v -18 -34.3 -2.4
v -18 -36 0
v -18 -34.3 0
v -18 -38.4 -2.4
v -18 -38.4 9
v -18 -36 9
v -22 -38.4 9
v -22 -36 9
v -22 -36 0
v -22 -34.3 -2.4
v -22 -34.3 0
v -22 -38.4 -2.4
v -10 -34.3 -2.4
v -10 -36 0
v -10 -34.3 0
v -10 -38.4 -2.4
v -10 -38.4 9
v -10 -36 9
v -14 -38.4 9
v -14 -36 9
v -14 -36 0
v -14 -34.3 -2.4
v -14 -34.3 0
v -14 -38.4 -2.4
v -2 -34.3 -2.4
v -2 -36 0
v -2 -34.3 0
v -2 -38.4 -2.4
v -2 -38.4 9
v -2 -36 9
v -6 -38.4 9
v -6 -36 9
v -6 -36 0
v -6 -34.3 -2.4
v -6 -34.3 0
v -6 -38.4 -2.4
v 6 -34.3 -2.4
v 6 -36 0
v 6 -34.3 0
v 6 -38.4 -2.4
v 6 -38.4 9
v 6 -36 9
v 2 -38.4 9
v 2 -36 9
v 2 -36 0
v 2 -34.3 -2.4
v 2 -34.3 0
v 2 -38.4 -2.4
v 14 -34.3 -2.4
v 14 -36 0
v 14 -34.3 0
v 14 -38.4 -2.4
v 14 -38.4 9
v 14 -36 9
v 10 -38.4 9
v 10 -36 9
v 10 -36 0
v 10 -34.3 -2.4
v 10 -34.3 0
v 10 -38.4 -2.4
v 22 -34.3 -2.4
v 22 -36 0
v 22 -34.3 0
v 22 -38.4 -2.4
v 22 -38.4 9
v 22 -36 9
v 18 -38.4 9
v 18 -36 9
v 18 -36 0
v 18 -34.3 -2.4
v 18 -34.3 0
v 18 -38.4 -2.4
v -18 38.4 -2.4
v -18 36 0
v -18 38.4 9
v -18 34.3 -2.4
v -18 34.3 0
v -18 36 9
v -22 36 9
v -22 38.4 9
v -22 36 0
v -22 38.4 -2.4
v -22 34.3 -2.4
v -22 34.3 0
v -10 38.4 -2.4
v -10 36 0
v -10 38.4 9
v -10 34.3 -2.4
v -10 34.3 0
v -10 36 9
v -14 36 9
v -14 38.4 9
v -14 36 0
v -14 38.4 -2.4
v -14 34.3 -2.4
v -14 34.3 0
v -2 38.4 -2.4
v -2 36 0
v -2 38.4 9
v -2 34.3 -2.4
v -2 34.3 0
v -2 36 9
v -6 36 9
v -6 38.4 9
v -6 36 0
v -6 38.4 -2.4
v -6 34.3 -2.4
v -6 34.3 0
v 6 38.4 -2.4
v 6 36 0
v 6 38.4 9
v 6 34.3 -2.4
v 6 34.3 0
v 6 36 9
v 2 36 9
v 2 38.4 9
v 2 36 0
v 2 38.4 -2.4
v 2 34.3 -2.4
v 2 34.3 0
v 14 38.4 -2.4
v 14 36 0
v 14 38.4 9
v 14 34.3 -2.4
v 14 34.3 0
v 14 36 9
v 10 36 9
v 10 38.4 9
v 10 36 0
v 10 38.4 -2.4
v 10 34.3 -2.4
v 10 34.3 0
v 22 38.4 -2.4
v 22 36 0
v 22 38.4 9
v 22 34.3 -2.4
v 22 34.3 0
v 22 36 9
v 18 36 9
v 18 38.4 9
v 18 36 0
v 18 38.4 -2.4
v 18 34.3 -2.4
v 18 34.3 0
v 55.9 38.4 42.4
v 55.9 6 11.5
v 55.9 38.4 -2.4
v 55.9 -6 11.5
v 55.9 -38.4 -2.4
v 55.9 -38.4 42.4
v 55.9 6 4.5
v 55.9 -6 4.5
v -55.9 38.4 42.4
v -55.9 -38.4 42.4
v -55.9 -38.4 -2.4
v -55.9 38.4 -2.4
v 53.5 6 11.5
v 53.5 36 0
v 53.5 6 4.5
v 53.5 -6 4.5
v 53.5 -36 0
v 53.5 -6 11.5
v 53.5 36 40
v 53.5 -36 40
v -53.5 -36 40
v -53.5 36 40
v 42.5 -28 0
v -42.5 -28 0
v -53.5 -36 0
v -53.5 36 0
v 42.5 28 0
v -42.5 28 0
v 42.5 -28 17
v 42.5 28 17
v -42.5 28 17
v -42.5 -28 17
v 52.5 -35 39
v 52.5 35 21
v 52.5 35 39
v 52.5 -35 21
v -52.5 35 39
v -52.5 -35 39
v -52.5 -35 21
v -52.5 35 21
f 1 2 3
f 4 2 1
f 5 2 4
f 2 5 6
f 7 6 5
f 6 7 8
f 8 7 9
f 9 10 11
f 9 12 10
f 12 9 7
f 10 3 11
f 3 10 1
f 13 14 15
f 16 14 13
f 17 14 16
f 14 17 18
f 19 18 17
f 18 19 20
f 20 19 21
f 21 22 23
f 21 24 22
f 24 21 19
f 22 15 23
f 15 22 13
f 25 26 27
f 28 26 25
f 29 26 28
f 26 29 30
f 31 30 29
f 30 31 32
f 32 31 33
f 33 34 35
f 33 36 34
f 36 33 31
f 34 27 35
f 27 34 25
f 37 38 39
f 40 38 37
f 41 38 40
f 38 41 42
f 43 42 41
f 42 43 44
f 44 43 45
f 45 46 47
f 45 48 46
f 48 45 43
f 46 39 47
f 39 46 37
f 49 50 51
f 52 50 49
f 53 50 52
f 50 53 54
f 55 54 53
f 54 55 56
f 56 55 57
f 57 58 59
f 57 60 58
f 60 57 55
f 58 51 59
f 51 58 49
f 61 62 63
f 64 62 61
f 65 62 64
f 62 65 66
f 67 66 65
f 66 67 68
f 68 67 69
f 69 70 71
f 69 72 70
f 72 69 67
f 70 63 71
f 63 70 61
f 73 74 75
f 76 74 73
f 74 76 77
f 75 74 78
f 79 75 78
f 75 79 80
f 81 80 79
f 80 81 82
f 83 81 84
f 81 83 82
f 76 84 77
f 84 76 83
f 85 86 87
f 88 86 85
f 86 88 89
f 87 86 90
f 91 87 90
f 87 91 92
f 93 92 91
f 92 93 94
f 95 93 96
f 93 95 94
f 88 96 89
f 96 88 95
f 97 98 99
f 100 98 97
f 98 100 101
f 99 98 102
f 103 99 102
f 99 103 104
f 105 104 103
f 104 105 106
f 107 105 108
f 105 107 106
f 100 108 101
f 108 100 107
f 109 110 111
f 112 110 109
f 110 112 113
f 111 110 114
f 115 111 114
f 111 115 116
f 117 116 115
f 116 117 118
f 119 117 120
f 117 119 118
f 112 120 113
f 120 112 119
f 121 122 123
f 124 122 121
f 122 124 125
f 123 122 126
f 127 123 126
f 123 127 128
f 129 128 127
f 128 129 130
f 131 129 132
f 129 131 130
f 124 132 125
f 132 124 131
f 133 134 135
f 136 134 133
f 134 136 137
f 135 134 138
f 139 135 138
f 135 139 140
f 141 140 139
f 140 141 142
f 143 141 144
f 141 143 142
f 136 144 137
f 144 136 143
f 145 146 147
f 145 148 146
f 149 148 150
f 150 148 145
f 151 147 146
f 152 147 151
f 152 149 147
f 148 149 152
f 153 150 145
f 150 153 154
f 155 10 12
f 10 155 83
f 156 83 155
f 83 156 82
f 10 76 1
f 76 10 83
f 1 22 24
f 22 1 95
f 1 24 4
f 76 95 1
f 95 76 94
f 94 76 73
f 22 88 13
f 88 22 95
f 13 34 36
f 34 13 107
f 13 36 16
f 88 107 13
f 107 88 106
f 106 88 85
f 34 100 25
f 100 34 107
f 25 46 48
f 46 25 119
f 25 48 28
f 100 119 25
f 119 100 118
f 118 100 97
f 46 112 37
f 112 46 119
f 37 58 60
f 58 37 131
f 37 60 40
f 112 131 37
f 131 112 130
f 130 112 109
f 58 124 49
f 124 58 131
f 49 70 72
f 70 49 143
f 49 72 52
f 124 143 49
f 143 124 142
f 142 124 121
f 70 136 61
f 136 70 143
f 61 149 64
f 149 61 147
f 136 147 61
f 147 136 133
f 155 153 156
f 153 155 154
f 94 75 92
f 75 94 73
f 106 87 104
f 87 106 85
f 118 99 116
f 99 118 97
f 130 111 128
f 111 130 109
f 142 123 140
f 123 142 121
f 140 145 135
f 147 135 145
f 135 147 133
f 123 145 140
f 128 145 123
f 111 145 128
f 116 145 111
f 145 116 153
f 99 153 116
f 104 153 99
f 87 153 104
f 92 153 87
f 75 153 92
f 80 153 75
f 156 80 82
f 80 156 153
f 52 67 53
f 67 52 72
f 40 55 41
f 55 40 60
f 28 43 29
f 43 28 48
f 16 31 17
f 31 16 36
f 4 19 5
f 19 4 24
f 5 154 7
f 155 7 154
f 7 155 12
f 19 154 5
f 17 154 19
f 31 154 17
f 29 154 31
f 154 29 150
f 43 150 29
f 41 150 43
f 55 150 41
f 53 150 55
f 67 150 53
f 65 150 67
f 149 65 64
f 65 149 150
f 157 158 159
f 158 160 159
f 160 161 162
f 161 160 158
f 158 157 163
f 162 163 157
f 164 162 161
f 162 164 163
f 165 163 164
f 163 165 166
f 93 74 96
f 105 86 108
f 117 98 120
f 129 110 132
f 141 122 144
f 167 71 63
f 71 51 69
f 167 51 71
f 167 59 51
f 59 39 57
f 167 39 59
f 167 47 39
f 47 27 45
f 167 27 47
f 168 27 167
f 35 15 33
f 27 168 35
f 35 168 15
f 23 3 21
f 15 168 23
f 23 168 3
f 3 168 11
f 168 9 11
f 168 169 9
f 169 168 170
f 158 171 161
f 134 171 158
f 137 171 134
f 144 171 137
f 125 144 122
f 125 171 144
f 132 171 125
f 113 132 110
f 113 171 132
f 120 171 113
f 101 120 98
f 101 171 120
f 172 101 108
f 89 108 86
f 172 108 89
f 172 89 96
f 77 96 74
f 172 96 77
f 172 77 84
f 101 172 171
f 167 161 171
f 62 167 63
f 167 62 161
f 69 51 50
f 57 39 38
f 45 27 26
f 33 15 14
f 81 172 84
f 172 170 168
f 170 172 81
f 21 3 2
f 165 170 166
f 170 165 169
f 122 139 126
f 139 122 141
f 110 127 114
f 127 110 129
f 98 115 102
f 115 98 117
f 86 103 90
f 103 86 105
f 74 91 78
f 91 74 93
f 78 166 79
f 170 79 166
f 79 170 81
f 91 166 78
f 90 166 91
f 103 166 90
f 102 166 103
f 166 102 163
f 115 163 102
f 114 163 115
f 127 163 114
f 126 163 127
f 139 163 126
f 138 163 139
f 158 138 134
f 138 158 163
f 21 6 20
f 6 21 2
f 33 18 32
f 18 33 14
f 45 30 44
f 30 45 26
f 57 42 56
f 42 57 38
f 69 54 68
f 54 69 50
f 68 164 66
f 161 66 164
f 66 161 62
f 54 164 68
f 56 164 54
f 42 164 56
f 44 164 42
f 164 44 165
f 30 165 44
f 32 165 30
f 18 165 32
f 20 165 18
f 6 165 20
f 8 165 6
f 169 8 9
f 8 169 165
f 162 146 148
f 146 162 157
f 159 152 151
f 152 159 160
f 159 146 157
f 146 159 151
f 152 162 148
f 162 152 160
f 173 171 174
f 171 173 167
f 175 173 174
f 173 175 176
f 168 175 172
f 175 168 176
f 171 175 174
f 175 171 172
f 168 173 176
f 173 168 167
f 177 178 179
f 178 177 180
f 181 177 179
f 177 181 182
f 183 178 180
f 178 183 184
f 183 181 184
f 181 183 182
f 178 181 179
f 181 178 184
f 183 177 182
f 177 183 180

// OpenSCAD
// Optional v2: wearable compute pack (lanyard / pocket). The glasses stay light: one thin USB-C cable
// to this pack. NOT part of v1 (v1 plugs straight into the laptop). Not rendered yet. Units: mm.
// Sizes are the vendors' published board sizes; the power bank is ASSUMED (check the one you buy).

view = "pack";

pi5_w = 85; pi5_d = 56; pi5_h = 17;     // Raspberry Pi 5 board + active cooler stack (cooler ~ 11 mm over the board)
bank_w = 105; bank_d = 70; bank_h = 18; // ASSUMED slim 10 Ah USB-C PD bank, ~ 200 g
wall = 2.4;
gap = 3;

module box(w, d, h) { translate([-w / 2, -d / 2, 0]) cube([w, d, h]); }

module pack_internals() {
    color("darkgreen") translate([0, 0, 0]) box(pi5_w, pi5_d, pi5_h);                // Pi 5 with cooler
    color("dimgray") translate([0, 0, pi5_h + gap + 1]) box(bank_w, bank_d, bank_h); // battery above it
}

module pack_shell() {
    inner_w = max(pi5_w, bank_w) + 2 * 1; inner_d = max(pi5_d, bank_d) + 2 * 1;
    inner_h = pi5_h + gap + 1 + bank_h + 1;
    difference() {
        translate([-inner_w / 2 - wall, -inner_d / 2 - wall, -wall]) cube([inner_w + 2 * wall, inner_d + 2 * wall, inner_h + 2 * wall]);
        translate([-inner_w / 2, -inner_d / 2, 0]) cube([inner_w, inner_d, inner_h]);
        // intake and exhaust slots for the Pi cooler fan (both long sides, low)
        for (s = [-1, 1]) for (i = [0:5]) translate([-20 + i * 8, s * (inner_d / 2 + 1), 3]) cube([4, wall + 3, 12], center = true);
        // USB-C exit for the glasses cable (short end, low)
        translate([inner_w / 2 + wall / 2, 0, 8]) cube([wall + 2, 12, 7], center = true);
    }
}

if (view == "pack") { color("slategray", 0.35) pack_shell(); pack_internals(); }
else if (view == "internals") { pack_internals(); }

echo(approx_mass_g = "Pi 5 46 + cooler 8 + bank 200 + shell ~60 = ~315 g");
echo(runtime_h_estimate = "10 Ah * 3.7 V = 37 Wh; Pi 5 at 6 W under load -> about 5 h, ASSUMED");
